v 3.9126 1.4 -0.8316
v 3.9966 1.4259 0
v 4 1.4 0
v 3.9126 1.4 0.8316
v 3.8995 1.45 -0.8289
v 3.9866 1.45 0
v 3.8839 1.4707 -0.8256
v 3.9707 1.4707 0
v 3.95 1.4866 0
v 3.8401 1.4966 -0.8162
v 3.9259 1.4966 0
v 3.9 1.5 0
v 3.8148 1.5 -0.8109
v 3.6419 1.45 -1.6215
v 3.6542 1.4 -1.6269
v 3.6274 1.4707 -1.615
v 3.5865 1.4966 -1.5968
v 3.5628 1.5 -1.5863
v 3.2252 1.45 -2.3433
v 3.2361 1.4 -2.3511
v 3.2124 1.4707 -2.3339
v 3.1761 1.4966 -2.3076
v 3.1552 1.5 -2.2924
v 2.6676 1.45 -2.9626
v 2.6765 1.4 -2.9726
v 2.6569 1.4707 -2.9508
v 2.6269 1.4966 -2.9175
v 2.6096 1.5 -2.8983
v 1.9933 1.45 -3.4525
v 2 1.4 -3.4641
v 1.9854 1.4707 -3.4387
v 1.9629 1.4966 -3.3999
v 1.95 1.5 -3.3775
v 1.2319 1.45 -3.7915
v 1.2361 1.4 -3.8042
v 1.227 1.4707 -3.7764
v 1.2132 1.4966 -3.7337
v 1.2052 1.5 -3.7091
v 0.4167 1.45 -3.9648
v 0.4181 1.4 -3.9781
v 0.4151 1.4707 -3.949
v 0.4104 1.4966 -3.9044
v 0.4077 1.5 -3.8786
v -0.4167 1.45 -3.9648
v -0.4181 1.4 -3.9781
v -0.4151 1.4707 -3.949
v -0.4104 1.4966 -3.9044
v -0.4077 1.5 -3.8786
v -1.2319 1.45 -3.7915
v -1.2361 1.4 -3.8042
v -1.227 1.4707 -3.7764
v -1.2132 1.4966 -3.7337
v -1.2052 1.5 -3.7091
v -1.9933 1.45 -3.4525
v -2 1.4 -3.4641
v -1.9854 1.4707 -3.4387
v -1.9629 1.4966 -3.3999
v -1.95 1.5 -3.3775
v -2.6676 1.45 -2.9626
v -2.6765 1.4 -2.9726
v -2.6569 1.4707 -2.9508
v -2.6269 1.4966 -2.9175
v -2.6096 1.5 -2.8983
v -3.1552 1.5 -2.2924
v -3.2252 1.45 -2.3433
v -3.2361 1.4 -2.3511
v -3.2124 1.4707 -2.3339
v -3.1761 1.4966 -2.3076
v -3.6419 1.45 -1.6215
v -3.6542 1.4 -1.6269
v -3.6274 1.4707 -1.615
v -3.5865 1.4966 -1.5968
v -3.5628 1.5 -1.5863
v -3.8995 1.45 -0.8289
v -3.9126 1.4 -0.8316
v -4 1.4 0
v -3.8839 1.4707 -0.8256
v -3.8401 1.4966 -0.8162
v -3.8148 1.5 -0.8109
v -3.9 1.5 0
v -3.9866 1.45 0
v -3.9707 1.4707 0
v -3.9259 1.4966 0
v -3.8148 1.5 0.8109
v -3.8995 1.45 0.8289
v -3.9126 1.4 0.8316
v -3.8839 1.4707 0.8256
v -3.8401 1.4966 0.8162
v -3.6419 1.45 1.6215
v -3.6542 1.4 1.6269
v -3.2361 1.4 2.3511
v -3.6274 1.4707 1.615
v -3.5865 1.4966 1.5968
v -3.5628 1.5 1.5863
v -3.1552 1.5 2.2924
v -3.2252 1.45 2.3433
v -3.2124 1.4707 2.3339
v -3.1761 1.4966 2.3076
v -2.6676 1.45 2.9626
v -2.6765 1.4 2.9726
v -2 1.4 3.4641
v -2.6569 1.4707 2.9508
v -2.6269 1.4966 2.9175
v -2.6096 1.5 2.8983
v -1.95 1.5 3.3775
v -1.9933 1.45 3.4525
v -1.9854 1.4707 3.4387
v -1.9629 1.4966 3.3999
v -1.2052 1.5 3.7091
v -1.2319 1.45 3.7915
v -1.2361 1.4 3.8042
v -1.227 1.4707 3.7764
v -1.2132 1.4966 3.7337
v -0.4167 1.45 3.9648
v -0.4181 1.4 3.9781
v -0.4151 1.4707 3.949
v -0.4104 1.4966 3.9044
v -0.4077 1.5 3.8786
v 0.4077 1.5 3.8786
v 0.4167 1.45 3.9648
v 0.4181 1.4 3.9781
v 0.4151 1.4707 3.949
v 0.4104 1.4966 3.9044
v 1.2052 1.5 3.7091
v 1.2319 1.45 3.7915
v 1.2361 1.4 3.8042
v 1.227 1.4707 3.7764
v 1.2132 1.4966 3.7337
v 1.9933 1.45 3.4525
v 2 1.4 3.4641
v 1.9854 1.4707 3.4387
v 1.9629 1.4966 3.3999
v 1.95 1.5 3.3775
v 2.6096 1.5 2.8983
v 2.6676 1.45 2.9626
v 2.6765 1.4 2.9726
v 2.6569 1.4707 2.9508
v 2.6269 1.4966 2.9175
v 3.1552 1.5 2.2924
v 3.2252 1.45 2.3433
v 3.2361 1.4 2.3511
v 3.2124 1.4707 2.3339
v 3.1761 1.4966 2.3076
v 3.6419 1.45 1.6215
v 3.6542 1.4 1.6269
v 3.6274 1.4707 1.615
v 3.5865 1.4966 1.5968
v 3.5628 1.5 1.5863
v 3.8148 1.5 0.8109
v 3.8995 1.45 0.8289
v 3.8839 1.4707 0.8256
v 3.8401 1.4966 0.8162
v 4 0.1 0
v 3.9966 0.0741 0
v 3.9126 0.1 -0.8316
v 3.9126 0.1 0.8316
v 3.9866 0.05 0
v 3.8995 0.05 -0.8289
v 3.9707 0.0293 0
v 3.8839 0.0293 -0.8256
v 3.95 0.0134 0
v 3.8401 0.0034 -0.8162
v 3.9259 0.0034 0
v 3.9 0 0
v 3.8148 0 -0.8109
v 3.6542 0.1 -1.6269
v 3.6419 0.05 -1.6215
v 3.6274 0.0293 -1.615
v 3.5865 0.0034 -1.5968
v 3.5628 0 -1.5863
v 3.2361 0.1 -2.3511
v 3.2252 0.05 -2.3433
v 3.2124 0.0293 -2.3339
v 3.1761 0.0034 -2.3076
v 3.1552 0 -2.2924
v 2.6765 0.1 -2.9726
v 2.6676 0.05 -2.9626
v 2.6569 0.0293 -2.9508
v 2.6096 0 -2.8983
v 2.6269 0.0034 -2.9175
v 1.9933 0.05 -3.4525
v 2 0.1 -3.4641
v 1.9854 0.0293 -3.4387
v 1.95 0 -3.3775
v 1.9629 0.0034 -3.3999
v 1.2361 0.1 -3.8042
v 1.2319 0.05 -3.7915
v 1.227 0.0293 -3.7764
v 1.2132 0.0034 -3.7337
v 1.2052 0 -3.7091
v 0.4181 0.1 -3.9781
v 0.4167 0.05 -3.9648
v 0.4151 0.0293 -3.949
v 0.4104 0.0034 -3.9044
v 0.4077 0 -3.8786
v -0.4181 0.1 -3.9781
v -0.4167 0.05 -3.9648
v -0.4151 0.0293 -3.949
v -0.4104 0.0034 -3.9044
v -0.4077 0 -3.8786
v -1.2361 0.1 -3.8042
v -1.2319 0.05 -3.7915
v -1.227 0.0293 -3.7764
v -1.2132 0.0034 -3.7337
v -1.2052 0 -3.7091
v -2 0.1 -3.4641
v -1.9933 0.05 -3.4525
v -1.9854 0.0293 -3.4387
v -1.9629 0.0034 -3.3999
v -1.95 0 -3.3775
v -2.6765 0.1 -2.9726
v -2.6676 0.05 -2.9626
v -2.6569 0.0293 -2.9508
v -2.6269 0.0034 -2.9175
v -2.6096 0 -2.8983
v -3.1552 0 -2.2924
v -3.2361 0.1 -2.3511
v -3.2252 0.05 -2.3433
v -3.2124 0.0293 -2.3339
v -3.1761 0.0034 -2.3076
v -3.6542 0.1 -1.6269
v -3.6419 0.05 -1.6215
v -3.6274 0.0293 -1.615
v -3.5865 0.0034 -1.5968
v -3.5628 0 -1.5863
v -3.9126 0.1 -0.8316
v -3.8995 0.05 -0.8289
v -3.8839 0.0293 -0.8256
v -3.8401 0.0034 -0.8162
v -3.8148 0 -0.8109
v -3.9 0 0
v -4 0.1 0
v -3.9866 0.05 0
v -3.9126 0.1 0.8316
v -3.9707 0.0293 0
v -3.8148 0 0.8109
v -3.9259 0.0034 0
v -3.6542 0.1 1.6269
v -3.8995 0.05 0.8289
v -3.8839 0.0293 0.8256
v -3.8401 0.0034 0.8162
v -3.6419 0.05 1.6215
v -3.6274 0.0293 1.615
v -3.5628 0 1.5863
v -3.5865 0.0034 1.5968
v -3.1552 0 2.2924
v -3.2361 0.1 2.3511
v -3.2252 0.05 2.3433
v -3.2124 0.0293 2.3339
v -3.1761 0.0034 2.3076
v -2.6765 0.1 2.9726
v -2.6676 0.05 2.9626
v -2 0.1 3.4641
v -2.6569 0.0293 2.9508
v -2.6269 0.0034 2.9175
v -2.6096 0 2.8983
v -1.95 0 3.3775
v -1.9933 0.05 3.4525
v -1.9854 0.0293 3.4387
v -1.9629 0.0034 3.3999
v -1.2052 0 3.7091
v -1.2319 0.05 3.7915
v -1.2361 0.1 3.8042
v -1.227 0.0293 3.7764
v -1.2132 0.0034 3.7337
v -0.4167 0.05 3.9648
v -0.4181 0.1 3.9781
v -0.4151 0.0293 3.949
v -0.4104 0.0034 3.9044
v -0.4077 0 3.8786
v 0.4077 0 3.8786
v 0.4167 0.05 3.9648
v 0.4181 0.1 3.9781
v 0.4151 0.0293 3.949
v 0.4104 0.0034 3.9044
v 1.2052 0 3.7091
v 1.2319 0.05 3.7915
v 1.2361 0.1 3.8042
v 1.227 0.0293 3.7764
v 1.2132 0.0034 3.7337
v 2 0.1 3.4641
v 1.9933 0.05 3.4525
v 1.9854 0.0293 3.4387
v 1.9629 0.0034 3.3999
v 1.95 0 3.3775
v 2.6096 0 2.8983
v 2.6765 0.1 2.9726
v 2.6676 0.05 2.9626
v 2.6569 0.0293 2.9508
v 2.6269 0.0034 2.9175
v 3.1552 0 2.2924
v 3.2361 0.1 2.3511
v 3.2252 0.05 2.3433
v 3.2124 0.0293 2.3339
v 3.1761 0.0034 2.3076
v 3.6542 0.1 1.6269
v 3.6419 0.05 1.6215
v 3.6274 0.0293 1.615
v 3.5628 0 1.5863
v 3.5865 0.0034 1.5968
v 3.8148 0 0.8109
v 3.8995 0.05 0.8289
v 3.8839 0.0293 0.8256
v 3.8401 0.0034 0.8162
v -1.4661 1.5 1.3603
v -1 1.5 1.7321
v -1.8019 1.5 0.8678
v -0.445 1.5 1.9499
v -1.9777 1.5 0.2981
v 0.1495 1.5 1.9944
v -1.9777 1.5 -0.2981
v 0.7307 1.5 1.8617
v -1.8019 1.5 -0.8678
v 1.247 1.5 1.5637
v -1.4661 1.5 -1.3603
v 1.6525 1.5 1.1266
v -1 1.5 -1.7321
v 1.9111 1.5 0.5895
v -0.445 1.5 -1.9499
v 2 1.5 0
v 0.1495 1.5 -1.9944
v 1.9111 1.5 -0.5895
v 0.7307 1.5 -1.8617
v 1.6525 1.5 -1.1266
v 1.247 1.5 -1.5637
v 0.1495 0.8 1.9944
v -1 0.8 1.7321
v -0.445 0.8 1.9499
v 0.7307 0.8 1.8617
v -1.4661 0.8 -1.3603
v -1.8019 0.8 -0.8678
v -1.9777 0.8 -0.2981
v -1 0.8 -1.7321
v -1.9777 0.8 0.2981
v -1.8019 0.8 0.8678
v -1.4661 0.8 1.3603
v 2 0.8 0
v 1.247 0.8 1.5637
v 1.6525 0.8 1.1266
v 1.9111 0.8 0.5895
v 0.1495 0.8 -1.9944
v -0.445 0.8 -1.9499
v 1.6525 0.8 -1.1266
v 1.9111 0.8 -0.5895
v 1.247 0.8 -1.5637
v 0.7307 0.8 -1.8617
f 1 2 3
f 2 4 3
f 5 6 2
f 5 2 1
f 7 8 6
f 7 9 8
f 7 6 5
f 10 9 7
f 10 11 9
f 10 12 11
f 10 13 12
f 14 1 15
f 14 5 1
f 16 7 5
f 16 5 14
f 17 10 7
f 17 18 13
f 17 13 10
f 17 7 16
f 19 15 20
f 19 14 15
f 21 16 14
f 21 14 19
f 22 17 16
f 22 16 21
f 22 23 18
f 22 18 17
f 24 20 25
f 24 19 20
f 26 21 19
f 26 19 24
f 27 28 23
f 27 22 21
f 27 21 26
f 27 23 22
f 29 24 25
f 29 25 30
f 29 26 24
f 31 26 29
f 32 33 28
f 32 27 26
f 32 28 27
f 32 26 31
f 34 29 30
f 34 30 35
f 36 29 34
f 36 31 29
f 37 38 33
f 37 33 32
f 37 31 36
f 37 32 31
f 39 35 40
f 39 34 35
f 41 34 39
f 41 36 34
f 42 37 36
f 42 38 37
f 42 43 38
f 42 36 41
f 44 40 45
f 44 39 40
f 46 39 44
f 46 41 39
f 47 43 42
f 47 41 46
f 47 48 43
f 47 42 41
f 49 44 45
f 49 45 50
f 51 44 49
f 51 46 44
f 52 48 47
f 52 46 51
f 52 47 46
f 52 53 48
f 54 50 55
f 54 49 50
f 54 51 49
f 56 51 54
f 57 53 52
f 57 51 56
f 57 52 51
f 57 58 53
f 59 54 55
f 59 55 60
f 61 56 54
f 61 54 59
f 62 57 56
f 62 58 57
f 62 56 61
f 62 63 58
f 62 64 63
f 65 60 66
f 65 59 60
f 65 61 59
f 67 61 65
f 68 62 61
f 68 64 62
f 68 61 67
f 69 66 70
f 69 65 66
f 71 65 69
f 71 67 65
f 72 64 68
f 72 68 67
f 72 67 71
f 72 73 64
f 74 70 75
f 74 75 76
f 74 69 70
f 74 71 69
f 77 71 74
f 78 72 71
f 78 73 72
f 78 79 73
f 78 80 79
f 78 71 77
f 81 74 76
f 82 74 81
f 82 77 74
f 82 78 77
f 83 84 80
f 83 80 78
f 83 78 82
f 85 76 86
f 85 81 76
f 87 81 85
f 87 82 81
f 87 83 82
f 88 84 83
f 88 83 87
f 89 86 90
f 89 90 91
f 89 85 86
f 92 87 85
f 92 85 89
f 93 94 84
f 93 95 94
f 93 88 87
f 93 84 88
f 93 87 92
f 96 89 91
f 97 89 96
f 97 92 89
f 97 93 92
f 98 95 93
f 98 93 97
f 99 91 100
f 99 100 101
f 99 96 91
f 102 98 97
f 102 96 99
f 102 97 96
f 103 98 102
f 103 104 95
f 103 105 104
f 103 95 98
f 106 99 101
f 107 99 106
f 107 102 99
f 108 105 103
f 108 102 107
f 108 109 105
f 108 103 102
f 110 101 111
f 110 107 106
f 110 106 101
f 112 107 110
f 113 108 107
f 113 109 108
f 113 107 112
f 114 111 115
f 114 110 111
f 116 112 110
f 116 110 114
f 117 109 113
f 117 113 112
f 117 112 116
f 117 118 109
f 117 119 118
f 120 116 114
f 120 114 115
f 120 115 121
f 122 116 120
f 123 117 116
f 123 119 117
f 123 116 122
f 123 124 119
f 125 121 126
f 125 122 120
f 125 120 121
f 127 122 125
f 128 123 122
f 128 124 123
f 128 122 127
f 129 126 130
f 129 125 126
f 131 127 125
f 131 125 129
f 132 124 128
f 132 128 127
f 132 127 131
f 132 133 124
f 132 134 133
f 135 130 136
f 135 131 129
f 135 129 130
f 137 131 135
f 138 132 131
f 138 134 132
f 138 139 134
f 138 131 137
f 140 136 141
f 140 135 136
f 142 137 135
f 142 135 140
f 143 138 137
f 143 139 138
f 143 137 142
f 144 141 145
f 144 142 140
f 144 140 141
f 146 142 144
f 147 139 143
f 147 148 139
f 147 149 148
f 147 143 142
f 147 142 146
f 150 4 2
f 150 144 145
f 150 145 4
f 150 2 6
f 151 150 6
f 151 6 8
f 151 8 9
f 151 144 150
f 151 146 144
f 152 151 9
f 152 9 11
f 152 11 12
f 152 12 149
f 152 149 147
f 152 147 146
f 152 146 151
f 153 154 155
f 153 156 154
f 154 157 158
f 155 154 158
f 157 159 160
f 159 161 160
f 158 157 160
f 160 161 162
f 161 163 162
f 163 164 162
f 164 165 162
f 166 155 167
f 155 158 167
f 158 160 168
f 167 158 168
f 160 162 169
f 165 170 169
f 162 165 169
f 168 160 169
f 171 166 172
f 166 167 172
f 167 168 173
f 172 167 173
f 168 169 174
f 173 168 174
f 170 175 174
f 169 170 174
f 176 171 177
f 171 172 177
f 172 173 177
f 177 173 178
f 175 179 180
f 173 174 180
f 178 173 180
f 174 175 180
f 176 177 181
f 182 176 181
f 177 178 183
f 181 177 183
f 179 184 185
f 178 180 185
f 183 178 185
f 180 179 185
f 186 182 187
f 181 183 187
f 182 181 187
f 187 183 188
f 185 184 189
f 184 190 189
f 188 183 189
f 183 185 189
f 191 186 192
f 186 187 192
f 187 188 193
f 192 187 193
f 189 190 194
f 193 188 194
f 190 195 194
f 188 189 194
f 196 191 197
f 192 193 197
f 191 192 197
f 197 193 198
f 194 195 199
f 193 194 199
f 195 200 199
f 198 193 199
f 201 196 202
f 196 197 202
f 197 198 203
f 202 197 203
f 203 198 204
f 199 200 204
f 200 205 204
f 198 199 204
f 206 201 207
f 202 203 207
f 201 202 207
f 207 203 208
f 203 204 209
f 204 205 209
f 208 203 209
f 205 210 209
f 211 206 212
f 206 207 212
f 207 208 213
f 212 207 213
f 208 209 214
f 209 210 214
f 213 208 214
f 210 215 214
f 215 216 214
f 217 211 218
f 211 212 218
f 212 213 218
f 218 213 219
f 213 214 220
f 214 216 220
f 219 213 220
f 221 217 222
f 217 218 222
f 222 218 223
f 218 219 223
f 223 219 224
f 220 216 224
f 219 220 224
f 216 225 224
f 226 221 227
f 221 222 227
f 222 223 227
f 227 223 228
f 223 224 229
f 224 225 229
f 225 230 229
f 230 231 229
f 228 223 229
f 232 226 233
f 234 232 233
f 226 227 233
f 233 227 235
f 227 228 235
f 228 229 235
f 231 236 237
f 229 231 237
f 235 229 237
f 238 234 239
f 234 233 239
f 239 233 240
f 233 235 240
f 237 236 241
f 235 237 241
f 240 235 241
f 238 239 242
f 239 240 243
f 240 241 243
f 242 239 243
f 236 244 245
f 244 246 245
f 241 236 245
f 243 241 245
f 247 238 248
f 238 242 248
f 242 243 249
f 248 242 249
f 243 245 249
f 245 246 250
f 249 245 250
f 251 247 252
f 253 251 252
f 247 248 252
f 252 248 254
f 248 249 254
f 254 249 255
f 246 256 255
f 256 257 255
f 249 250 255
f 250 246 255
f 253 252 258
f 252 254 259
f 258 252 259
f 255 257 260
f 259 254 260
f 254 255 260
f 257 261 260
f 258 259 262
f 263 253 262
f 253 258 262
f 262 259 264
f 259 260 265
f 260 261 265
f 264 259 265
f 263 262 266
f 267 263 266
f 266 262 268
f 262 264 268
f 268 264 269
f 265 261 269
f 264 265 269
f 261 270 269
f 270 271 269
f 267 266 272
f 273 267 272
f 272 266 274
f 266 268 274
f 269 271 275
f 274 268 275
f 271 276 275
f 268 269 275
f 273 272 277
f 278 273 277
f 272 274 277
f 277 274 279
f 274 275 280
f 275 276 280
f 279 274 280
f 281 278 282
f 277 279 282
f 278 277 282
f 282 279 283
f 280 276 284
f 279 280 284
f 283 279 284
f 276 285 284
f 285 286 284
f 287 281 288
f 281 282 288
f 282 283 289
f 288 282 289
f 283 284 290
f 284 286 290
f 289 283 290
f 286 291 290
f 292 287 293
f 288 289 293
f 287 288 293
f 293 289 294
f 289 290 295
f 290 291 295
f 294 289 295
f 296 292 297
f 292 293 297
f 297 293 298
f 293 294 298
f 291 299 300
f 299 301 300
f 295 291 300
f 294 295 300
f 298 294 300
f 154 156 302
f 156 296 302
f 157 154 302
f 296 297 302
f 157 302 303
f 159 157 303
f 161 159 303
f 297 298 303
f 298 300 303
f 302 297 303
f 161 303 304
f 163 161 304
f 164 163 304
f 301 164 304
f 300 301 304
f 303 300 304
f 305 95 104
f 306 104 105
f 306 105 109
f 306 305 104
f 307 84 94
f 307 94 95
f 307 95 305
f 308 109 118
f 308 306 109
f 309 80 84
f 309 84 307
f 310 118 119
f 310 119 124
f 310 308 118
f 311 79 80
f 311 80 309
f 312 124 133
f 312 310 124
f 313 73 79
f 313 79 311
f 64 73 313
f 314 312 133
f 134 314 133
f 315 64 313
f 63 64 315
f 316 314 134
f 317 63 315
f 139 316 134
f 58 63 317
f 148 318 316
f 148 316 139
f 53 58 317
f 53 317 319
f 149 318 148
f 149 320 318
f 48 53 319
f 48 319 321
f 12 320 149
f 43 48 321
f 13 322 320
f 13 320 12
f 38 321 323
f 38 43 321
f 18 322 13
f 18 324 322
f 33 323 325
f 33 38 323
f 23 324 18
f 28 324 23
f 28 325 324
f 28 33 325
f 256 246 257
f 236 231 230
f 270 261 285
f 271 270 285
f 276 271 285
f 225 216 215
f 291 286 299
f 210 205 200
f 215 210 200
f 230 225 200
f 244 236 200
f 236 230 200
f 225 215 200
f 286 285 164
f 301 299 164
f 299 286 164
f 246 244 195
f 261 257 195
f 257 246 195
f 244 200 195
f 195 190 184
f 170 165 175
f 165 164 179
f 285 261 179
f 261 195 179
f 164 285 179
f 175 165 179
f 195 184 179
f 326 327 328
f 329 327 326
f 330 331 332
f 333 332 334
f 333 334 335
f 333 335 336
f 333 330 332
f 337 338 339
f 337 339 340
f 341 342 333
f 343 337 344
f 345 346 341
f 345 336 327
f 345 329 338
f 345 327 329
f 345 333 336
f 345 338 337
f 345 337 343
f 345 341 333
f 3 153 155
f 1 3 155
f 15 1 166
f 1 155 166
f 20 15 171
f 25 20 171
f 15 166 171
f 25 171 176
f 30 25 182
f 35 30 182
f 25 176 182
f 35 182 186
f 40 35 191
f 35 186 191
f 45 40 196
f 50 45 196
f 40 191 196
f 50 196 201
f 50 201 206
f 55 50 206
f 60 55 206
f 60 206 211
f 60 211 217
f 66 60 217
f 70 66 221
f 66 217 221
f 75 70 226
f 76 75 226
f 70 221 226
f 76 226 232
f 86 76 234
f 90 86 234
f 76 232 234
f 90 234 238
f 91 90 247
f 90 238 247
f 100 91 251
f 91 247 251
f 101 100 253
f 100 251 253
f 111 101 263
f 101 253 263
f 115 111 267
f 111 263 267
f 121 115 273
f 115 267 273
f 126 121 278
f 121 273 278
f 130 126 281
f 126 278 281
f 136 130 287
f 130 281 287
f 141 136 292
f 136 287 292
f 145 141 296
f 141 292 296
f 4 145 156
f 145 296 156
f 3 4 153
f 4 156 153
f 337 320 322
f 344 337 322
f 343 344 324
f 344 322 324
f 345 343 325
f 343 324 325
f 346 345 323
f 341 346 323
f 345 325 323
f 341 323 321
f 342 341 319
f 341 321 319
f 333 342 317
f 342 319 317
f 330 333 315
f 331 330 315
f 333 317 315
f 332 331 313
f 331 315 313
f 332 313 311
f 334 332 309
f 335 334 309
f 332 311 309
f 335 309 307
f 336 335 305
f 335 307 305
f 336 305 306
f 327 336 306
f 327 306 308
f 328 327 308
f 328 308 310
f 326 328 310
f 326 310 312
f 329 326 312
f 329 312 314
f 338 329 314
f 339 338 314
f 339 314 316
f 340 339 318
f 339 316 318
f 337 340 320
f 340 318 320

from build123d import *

# Parameters (mm, degrees)
SKETCH1_R           = 4
BOSS_EXTRUDE1_DEPTH = 1.5
SKETCH2_R           = 2
CUT_EXTRUDE1_DEPTH  = 0.7
FILLET2_R           = 0.1
FILLET3_R           = 0.1


with BuildPart() as part:
    # Sketch1 → Boss-Extrude1 (new body)
    with BuildSketch(Plane(origin=(0, 0, 0), x_dir=(1, 0, 0), z_dir=(0, 1, 0))):
        Circle(SKETCH1_R)
    extrude(amount=BOSS_EXTRUDE1_DEPTH)

    # Sketch2 → Cut-Extrude1 (cut)
    with BuildSketch(Plane(origin=(0, 1.5, 0), x_dir=(1, 0, 0), z_dir=(0, 1, 0))):
        Circle(SKETCH2_R)
    extrude(amount=-CUT_EXTRUDE1_DEPTH, mode=Mode.SUBTRACT)

    # Fillet2
    fillet2_edges = [part.edges().sort_by_distance(p)[0] for p in [
        (-4, 0, 0),
    ]]
    fillet(fillet2_edges, radius=FILLET2_R)

    # Fillet3
    fillet3_edges = [part.edges().sort_by_distance(p)[0] for p in [
        (-4, 1.5, 0),
    ]]
    fillet(fillet3_edges, radius=FILLET3_R)


solid = part.part
